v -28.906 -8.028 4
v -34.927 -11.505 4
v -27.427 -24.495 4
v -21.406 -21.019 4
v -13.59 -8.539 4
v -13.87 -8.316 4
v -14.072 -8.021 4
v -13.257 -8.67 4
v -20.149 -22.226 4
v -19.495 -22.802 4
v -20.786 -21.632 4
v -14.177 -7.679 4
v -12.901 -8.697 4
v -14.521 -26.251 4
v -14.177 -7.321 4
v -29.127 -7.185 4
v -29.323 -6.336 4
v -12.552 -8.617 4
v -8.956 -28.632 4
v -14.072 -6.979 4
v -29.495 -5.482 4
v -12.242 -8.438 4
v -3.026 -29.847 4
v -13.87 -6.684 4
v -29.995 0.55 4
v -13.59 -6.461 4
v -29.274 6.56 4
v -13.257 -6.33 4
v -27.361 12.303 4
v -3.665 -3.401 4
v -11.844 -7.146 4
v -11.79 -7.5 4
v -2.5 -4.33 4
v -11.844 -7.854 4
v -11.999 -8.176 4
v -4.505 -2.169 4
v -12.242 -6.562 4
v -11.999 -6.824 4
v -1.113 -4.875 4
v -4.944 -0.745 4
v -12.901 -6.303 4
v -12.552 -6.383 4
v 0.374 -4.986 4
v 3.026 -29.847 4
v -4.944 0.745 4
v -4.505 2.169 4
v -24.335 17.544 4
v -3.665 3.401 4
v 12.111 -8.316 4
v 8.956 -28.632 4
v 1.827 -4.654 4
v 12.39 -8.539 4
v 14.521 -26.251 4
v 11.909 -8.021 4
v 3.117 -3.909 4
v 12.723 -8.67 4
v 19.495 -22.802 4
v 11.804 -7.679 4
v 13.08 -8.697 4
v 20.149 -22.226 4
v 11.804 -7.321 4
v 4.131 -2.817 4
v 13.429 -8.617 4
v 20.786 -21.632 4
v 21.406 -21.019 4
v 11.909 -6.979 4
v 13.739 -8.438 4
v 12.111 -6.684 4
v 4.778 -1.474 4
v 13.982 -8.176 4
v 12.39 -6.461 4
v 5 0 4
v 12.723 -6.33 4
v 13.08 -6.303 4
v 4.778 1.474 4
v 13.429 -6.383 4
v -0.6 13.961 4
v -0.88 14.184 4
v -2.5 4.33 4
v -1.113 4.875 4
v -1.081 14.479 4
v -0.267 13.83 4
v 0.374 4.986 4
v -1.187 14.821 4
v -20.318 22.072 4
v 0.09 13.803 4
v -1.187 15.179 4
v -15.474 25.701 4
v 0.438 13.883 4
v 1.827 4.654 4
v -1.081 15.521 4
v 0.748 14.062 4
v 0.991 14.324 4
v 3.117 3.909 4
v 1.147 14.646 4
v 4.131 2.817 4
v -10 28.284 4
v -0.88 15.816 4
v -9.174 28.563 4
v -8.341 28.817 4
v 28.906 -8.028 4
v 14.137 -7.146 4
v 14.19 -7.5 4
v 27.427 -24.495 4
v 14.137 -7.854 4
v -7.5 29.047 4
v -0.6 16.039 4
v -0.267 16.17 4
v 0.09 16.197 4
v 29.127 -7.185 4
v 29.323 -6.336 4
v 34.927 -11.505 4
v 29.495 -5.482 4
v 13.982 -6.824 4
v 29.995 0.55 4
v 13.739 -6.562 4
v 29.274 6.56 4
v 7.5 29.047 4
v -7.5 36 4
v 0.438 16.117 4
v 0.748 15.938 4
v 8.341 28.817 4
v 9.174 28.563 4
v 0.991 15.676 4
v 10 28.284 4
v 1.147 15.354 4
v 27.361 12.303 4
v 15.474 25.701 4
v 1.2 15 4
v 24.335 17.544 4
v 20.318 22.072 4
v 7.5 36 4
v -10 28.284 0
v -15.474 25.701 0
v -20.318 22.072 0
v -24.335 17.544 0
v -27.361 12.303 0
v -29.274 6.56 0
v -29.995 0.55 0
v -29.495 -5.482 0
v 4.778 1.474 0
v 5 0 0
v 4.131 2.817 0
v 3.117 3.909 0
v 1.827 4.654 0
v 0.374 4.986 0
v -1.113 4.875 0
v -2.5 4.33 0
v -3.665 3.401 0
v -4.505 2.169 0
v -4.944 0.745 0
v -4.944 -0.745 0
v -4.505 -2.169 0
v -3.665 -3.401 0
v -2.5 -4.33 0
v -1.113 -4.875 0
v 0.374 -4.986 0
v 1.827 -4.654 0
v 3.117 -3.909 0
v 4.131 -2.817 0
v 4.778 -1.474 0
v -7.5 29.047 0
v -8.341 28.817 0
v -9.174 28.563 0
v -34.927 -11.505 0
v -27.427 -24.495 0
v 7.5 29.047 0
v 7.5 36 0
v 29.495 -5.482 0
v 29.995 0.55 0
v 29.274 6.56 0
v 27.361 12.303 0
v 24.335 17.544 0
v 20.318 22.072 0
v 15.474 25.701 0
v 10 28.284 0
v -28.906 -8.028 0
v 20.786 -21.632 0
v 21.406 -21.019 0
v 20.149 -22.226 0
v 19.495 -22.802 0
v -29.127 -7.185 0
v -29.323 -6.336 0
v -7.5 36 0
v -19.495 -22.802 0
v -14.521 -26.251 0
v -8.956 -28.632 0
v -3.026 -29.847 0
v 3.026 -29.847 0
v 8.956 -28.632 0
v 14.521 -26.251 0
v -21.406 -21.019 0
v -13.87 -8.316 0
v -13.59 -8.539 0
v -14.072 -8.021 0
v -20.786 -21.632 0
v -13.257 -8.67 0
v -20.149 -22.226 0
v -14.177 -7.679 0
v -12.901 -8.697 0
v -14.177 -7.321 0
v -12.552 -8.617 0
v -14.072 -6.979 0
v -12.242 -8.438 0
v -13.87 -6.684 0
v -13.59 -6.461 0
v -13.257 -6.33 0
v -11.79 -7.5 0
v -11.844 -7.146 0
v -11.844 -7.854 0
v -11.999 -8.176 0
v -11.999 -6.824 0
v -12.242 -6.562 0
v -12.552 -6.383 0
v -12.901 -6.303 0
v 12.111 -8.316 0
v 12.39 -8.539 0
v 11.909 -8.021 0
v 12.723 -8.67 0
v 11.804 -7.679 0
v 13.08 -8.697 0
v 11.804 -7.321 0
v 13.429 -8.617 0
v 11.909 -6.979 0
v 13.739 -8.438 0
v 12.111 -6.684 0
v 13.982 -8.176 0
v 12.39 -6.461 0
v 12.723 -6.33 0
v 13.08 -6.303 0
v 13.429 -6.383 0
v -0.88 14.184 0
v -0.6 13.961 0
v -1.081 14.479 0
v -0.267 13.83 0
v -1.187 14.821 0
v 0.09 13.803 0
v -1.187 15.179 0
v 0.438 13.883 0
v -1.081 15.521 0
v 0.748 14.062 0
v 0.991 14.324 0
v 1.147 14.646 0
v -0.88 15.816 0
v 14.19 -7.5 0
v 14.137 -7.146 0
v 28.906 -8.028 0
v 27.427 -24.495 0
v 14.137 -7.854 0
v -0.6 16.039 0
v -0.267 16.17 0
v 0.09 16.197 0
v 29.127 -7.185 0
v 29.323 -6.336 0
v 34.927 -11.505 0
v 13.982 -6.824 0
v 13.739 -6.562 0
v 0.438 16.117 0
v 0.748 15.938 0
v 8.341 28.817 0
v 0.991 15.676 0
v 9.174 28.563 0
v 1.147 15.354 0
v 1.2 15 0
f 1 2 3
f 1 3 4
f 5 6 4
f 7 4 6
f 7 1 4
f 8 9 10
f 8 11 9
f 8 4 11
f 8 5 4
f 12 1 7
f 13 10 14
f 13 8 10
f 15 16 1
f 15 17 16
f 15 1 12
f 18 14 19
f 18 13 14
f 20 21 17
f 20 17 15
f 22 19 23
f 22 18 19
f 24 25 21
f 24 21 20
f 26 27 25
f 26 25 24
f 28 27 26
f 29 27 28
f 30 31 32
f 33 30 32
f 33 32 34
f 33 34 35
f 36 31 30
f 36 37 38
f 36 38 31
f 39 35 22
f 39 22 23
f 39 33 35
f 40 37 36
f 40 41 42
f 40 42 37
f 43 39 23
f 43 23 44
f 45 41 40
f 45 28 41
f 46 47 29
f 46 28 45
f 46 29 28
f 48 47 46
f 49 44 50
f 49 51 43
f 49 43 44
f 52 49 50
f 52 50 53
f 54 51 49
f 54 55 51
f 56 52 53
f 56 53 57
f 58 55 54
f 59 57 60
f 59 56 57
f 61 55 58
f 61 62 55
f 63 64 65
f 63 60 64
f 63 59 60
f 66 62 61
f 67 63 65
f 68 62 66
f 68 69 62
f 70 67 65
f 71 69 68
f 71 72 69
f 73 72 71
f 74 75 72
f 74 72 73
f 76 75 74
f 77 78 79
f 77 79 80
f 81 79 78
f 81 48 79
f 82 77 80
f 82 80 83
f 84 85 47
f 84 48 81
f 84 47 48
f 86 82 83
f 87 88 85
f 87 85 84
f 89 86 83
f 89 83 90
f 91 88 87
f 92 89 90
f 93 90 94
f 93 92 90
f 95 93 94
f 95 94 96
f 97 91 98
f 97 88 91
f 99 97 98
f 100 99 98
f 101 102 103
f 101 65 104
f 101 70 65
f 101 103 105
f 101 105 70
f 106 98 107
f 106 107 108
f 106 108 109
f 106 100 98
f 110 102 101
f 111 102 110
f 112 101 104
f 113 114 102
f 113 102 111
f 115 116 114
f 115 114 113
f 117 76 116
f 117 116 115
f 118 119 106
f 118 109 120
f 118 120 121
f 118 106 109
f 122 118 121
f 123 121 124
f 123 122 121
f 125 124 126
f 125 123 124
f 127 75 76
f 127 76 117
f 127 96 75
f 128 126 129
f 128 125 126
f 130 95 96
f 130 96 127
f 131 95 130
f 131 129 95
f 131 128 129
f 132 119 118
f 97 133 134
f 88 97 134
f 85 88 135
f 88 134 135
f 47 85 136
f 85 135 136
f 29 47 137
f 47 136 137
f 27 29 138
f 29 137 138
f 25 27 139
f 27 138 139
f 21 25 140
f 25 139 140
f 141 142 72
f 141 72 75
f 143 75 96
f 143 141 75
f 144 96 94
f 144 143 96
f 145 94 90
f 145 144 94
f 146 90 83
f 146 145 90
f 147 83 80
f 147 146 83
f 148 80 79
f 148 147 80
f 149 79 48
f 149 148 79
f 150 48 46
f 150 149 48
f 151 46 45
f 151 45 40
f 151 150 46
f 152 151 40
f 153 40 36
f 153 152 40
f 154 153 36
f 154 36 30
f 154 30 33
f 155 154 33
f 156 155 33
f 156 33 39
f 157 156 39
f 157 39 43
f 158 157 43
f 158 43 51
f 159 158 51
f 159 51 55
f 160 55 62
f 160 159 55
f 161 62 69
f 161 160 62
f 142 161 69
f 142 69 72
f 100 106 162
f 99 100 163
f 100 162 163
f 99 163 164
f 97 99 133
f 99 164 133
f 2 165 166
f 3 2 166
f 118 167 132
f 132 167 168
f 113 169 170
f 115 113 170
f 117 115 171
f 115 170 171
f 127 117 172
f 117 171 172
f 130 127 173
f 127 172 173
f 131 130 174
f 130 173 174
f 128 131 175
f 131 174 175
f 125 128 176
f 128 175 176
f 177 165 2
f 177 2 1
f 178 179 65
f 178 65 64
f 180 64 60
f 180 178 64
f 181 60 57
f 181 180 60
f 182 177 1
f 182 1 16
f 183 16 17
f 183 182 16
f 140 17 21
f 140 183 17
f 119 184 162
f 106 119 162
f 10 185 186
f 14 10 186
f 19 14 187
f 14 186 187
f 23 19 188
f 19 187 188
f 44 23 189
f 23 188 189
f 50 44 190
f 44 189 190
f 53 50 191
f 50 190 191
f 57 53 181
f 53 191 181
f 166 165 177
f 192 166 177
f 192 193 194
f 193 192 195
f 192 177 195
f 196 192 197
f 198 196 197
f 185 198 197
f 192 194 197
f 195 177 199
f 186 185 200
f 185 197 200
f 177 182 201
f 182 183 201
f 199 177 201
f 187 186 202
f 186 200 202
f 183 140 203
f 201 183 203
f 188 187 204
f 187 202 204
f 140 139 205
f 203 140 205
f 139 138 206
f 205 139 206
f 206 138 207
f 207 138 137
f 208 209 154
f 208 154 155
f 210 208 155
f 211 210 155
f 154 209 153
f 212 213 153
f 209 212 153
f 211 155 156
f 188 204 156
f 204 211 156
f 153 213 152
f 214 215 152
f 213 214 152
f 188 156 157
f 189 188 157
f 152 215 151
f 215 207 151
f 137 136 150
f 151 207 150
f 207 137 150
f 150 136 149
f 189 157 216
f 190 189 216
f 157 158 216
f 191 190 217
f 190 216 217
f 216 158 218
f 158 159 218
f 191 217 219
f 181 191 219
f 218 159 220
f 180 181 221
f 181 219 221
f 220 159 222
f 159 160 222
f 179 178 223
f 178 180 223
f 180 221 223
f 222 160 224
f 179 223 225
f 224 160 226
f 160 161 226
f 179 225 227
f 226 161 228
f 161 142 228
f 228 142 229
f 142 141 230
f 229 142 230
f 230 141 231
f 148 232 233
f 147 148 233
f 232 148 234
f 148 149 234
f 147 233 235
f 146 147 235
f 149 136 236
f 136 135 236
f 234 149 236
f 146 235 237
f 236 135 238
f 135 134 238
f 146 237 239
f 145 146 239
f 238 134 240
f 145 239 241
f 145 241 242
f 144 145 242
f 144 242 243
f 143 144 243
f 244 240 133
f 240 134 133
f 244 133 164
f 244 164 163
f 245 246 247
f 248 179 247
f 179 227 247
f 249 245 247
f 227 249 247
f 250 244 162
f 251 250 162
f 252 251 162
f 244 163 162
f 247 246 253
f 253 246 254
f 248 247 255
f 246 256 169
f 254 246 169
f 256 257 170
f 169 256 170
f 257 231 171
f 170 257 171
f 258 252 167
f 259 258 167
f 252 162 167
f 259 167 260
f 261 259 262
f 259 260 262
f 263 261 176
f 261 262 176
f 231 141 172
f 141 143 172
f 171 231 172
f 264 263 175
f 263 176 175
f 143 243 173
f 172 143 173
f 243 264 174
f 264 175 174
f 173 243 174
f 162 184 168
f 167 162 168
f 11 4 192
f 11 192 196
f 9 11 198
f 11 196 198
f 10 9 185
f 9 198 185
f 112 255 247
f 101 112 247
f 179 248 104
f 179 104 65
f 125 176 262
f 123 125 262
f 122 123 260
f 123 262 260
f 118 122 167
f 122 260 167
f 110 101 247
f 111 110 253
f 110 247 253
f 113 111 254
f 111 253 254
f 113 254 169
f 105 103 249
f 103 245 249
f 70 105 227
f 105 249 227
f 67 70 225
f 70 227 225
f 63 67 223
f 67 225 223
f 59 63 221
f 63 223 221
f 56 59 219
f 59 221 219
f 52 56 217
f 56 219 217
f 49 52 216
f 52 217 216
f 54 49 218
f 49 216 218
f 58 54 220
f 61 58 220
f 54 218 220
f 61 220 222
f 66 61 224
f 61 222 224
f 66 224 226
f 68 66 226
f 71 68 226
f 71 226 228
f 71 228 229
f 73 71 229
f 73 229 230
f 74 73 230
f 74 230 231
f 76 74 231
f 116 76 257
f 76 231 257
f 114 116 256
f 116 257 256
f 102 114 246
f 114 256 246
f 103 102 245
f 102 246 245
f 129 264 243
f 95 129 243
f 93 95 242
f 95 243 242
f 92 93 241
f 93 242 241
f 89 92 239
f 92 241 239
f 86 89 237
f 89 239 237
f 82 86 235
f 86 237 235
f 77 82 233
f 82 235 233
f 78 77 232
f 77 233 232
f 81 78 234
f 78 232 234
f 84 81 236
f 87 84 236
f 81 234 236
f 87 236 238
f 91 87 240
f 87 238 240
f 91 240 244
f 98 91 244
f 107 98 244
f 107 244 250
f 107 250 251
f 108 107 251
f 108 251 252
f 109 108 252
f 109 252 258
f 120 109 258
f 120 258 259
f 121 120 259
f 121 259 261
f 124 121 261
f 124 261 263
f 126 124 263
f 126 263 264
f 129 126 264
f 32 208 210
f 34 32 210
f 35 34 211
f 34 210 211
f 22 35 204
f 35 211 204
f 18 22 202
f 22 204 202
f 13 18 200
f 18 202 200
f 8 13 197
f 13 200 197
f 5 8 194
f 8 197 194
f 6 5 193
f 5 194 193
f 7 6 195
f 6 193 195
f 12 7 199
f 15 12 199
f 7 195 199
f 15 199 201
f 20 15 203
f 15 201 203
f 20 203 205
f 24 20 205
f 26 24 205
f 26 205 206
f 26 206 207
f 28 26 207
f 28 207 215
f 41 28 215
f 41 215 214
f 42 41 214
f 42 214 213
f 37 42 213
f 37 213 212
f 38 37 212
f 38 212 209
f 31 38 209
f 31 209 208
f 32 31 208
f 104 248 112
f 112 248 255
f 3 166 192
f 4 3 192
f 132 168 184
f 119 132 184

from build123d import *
from build123d.topology import SkipClean

# Parameters (mm, degrees)
SKETCH_1_R          = 5
EXTRUDE_1_DEPTH     = 4
CUT_EXTRUDE_1_DEPTH = 10
SKETCH_3_R          = 1.2
CUT_EXTRUDE_2_DEPTH = 5


with BuildPart() as part:
    # 草图1 → 凸台-拉伸1 (new body)
    with BuildSketch(Plane.XY):
        with BuildLine():
            Line((10, 28.284271247), (10, 36))
            Line((10, 36), (-10, 36))
            Line((-10, 36), (-10, 28.284271247))
            ThreePointArc((-10, 28.284271247), (-25.980762114, 15), (-29.494897428, -5.481881586))
            Line((-29.494897428, -5.481881586), (-36.176914536, -9.339745962))
            Line((-36.176914536, -9.339745962), (-26.176914536, -26.660254038))
            Line((-26.176914536, -26.660254038), (-19.494897428, -22.802389662))
            ThreePointArc((-19.494897428, -22.802389662), (0, -30), (19.494897428, -22.802389662))
            Line((19.494897428, -22.802389662), (26.176914536, -26.660254038))
            Line((26.176914536, -26.660254038), (36.176914536, -9.339745962))
            Line((36.176914536, -9.339745962), (29.494897428, -5.481881586))
            ThreePointArc((29.494897428, -5.481881586), (25.980762114, 15), (10, 28.284271247))
        make_face()
        Circle(SKETCH_1_R, mode=Mode.SUBTRACT)
    extrude(amount=EXTRUDE_1_DEPTH)

    # 草图2 → 切除-拉伸1 (cut)
    with SkipClean():  # the faces are left unmerged after this step: merging them gives an invalid solid
        with BuildSketch(Plane(origin=(0, 0, 0), x_dir=(-1, 0, 0), z_dir=(0, 0, -1))):
            with BuildLine():
                Line((-7.5, 29.047375097), (-7.5, 36))
                Line((-7.5, 36), (-10, 36))
                Line((-10, 36), (-10, 28.284271247))
                ThreePointArc((-10, 28.284271247), (-8.758315013, 28.693063938), (-7.5, 29.047375097))
            make_face()
            with BuildLine():
                Line((7.5, 36), (7.5, 29.047375097))
                ThreePointArc((7.5, 29.047375097), (8.758315013, 28.693063938), (10, 28.284271247))
                Line((10, 28.284271247), (10, 36))
                Line((10, 36), (7.5, 36))
            make_face()
            with BuildLine():
                Line((-34.926914536, -11.504809472), (-28.905764747, -8.02849702))
                ThreePointArc((-28.905764747, -8.02849702), (-29.228079789, -6.761608673), (-29.494897428, -5.481881586))
                Line((-29.494897428, -5.481881586), (-36.176914536, -9.339745962))
                Line((-36.176914536, -9.339745962), (-34.926914536, -11.504809472))
            make_face()
            with BuildLine():
                Line((-26.176914536, -26.660254038), (-27.426914536, -24.495190528))
                Line((-27.426914536, -24.495190528), (-21.405764747, -21.018878077))
                ThreePointArc((-21.405764747, -21.018878077), (-20.469764776, -21.931455265), (-19.494897428, -22.802389662))
                Line((-19.494897428, -22.802389662), (-26.176914536, -26.660254038))
            make_face()
            with BuildLine():
                Line((36.176914536, -9.339745962), (34.926914536, -11.504809472))
                Line((34.926914536, -11.504809472), (28.905764747, -8.02849702))
                ThreePointArc((28.905764747, -8.02849702), (29.228079789, -6.761608673), (29.494897428, -5.481881586))
                Line((29.494897428, -5.481881586), (36.176914536, -9.339745962))
            make_face()
            with BuildLine():
                Line((27.426914536, -24.495190528), (21.405764747, -21.018878077))
                ThreePointArc((21.405764747, -21.018878077), (20.469764776, -21.931455265), (19.494897428, -22.802389662))
                Line((19.494897428, -22.802389662), (26.176914536, -26.660254038))
                Line((26.176914536, -26.660254038), (27.426914536, -24.495190528))
            make_face()
        extrude(amount=-CUT_EXTRUDE_1_DEPTH, mode=Mode.SUBTRACT)

    # 草图3 → 切除-拉伸2 (cut, symmetric)
    with SkipClean():  # the faces are left unmerged after this step: merging them gives an invalid solid
        with BuildSketch(Plane(origin=(0, 0, 0), x_dir=(-1, 0, 0), z_dir=(0, 0, -1))):
            with Locations(Location((0, 15, 0), (0, 0, 180))):
                Circle(SKETCH_3_R)
            with Locations(Location((12.990381057, -7.5, 0), (0, 0, 180))):
                Circle(SKETCH_3_R)
            with Locations(Location((-12.990381057, -7.5, 0), (0, 0, 180))):
                Circle(SKETCH_3_R)
        extrude(amount=CUT_EXTRUDE_2_DEPTH, both=True, mode=Mode.SUBTRACT)


solid = part.part
